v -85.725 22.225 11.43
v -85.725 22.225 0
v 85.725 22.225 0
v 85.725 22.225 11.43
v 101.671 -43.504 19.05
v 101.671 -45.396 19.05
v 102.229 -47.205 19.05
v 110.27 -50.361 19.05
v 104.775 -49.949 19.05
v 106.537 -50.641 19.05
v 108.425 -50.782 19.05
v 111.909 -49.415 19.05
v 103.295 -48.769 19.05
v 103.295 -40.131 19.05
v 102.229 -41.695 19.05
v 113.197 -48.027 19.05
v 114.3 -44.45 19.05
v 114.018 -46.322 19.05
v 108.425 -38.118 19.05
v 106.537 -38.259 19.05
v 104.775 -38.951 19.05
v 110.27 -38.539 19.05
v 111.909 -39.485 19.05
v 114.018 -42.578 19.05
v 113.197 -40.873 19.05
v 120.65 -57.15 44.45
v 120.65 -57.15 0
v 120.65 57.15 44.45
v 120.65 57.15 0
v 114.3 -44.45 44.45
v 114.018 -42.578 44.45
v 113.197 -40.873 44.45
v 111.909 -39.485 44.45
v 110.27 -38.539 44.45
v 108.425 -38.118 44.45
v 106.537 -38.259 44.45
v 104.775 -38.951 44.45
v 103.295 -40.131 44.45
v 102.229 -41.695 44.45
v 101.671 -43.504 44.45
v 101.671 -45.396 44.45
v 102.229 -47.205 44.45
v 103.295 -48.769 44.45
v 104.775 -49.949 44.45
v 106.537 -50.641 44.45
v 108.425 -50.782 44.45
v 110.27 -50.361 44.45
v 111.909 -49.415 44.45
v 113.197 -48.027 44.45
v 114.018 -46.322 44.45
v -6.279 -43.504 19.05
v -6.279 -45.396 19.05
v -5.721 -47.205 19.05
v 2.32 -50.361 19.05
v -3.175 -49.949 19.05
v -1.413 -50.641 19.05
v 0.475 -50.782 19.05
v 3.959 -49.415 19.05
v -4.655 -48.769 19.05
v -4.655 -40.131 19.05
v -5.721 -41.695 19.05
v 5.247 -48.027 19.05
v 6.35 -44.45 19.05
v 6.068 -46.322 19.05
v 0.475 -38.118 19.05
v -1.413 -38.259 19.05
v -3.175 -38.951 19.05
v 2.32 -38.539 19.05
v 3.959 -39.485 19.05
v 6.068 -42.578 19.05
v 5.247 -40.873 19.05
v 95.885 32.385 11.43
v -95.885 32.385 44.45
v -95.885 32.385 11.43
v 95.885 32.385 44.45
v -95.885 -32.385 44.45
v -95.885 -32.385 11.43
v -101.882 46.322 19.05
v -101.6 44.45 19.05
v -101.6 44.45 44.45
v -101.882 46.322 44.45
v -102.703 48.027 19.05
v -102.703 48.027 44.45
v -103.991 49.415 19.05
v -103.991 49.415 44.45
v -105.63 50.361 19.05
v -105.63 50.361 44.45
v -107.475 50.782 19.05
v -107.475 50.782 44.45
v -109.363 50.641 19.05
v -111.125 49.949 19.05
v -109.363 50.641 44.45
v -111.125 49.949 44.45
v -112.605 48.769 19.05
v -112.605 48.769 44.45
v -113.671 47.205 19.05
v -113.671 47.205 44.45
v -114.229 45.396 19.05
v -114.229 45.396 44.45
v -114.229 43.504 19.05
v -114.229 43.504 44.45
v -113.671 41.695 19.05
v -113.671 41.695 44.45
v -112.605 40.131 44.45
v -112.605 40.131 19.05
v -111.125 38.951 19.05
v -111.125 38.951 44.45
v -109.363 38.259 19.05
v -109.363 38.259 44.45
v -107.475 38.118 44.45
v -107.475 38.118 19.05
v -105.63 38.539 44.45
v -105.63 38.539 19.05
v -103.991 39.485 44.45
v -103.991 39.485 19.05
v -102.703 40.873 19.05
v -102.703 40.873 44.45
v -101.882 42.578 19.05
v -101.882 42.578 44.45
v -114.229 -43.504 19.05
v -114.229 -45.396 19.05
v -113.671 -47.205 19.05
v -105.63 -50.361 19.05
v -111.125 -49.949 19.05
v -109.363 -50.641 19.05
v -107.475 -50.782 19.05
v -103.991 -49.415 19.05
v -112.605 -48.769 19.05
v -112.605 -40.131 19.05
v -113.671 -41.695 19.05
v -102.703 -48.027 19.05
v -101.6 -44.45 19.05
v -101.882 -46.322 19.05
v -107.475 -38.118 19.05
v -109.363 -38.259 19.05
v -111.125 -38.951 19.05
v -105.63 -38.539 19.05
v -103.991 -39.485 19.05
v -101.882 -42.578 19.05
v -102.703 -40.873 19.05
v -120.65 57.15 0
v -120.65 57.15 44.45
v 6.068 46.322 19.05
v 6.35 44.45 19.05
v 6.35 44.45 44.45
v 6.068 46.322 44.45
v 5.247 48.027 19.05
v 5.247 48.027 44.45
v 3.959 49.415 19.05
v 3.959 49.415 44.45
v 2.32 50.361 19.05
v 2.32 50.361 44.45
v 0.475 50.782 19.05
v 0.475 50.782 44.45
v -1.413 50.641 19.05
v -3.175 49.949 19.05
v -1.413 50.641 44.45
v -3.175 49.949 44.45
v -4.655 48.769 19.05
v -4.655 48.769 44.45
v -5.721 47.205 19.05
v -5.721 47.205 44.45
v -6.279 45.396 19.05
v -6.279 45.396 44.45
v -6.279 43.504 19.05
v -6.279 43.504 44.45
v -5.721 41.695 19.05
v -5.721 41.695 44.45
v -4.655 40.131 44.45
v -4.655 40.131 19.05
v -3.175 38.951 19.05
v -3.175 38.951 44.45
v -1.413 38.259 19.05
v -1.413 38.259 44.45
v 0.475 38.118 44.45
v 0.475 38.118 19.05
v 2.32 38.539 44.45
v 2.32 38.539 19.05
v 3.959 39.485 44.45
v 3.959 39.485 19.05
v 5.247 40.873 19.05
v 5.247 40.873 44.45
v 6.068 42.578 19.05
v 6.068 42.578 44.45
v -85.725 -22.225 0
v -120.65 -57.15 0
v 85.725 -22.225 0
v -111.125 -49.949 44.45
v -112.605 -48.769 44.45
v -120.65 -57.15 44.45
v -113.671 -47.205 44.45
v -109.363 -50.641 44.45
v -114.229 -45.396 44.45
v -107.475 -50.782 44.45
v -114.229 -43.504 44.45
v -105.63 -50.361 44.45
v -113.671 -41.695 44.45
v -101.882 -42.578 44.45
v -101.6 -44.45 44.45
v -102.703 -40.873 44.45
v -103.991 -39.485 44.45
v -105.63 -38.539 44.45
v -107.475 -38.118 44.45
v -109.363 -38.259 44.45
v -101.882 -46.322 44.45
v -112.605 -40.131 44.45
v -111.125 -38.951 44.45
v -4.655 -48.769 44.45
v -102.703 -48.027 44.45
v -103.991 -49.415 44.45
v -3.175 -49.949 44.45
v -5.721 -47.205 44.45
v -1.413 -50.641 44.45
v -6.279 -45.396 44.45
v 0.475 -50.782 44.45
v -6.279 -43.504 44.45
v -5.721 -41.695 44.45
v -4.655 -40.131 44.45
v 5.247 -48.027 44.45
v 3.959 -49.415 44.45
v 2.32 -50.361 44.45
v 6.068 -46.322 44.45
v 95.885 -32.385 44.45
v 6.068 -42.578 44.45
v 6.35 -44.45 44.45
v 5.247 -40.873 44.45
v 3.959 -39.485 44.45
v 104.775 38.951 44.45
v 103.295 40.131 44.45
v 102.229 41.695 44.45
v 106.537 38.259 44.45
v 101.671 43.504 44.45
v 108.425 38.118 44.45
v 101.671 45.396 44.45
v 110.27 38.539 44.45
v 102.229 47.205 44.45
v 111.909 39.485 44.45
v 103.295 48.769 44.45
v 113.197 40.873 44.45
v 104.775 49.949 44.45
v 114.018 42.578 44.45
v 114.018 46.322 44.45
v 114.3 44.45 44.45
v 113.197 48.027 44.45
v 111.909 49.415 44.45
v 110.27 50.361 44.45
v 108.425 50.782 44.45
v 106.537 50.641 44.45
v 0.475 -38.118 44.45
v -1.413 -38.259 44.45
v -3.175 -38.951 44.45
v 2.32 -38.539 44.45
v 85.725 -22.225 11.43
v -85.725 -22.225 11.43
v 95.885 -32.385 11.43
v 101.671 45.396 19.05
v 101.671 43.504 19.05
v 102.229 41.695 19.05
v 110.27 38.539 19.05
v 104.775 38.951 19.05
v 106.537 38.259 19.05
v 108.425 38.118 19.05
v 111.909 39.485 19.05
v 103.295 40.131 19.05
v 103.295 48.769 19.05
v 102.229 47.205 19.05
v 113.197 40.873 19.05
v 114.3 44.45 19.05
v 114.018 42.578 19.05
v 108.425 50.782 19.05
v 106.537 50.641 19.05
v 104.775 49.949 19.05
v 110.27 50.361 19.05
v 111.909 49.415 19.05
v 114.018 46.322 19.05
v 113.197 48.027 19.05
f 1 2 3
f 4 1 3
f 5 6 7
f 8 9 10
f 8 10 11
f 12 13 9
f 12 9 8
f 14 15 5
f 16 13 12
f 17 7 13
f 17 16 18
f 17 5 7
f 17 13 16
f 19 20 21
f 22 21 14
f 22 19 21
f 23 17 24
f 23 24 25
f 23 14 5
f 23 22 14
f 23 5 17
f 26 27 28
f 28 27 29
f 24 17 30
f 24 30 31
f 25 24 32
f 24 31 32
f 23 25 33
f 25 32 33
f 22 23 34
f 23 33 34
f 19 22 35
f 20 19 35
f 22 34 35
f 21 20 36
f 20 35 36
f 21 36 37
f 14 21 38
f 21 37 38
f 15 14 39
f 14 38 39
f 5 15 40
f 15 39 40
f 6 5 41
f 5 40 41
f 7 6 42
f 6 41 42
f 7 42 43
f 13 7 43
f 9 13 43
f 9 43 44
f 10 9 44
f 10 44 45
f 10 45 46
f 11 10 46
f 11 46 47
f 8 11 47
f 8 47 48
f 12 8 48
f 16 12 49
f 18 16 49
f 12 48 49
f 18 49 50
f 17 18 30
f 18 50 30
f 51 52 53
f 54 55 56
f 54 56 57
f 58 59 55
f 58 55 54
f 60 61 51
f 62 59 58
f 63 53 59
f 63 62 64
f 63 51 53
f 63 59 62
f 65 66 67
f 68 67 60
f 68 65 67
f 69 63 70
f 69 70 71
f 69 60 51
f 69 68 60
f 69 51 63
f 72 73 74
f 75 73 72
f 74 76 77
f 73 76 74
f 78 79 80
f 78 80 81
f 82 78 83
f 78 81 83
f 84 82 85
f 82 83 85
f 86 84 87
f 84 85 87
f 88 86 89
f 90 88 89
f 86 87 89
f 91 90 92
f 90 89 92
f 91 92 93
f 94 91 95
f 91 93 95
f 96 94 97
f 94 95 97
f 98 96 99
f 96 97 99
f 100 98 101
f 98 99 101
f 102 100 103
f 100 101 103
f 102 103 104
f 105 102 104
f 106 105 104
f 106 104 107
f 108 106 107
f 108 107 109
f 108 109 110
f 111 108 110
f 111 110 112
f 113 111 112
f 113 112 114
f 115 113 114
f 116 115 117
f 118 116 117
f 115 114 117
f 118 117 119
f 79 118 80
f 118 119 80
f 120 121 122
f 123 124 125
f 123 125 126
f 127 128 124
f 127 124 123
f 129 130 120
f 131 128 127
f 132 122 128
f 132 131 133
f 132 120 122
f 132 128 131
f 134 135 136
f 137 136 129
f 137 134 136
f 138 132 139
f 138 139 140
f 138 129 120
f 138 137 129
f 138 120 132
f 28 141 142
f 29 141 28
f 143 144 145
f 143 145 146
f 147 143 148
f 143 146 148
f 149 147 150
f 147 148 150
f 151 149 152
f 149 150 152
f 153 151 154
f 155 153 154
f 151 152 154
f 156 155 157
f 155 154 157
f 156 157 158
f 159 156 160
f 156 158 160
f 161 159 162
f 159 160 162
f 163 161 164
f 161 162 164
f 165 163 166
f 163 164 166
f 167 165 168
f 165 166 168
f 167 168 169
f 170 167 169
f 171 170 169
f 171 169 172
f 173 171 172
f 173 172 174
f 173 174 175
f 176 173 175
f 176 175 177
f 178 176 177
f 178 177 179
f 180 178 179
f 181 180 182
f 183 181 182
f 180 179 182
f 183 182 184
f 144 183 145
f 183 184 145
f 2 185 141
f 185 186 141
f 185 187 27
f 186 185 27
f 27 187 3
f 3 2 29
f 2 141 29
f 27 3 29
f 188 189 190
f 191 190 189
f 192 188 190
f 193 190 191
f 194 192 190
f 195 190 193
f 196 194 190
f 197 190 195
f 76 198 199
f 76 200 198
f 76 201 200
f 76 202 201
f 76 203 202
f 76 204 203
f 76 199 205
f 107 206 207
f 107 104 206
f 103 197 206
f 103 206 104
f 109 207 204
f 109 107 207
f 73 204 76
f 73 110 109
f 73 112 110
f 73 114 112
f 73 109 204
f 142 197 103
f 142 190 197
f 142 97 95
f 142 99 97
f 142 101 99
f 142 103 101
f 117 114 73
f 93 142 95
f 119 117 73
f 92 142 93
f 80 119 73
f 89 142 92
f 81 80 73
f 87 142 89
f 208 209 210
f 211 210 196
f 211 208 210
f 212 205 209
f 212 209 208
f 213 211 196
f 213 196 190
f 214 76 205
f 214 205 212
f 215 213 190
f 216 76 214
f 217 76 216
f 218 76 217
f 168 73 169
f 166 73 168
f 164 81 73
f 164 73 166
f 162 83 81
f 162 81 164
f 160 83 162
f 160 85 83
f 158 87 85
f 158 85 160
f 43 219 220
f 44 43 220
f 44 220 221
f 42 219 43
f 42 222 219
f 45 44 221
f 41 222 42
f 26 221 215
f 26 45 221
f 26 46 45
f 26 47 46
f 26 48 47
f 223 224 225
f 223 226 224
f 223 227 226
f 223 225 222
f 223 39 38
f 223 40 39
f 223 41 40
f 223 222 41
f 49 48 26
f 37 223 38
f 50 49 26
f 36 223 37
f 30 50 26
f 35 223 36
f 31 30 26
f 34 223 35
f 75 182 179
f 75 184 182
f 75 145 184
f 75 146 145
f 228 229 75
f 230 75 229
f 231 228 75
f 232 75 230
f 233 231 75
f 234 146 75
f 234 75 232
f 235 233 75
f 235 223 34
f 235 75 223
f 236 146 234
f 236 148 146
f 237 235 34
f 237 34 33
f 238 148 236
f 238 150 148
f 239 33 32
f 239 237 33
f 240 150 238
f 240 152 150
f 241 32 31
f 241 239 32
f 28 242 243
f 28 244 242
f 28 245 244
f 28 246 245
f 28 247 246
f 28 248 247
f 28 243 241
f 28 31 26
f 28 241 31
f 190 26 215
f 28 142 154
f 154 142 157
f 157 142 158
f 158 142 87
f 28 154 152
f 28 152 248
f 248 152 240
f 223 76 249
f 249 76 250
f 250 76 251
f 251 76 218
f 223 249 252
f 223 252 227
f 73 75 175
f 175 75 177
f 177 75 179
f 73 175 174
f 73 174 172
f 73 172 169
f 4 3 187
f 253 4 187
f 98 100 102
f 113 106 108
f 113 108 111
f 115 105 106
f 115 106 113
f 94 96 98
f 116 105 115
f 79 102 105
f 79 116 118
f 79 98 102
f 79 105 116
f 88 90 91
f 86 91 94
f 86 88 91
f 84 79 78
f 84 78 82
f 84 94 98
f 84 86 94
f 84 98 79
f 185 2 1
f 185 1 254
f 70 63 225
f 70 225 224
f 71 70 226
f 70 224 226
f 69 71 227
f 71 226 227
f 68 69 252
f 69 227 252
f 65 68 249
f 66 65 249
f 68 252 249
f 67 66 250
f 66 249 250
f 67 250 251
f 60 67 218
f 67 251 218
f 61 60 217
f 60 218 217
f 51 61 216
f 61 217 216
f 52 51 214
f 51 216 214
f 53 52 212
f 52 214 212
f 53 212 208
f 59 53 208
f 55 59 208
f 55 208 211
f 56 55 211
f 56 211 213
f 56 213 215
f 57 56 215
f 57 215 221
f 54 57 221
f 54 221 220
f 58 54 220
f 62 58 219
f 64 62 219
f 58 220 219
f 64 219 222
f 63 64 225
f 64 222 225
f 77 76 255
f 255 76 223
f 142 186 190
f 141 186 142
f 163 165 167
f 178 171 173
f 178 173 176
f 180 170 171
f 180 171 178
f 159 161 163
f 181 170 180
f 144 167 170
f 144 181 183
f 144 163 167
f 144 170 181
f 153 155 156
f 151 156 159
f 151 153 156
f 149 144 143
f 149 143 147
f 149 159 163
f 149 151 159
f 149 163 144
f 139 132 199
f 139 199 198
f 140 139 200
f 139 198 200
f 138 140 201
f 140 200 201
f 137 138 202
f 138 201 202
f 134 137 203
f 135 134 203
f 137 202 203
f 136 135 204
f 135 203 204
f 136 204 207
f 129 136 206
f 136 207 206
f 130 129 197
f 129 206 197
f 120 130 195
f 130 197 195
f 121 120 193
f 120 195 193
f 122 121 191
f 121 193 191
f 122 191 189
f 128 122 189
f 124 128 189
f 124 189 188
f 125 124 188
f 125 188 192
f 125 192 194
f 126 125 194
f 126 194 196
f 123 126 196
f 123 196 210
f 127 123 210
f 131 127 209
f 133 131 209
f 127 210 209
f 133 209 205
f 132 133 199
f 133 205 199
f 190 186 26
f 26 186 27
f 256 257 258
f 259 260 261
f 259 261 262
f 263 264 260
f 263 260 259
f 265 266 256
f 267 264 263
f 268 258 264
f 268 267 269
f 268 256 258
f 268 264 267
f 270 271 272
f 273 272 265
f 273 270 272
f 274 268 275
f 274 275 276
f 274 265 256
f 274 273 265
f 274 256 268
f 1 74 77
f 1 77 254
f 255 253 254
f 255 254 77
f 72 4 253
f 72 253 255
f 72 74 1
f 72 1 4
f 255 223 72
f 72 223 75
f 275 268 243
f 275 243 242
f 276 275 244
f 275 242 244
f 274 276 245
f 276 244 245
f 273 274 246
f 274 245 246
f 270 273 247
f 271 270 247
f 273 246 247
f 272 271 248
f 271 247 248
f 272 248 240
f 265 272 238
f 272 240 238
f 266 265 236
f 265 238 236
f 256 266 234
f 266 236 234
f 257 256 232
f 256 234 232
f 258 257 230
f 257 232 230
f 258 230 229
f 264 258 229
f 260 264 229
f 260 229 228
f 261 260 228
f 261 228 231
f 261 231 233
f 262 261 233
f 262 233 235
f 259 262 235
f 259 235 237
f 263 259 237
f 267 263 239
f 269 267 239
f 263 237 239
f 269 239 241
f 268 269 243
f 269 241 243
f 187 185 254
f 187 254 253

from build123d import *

# Parameters (mm, degrees)
F0_W     = 241.3
F0_H     = 114.3
F1_DEPTH = 44.45
F2_W     = 191.77
F2_H     = 64.77
F3_DEPTH = 33.02
F4_W     = 171.45
F4_H     = 44.45
F5_DEPTH = 25.4
F6_R     = 6.35
F7_DEPTH = 25.4


with BuildPart() as f1:
    # F0 (on Top) → F1 (new body)
    with BuildSketch(Plane.XY):
        Rectangle(F0_W, F0_H)
    extrude(amount=F1_DEPTH)

    # F2 (on face) → F3 (cut)
    with BuildSketch(Plane.XY.offset(44.45)):
        Rectangle(F2_W, F2_H)
    extrude(amount=-F3_DEPTH, mode=Mode.SUBTRACT)

    # F4 (on face) → F5 (cut)
    with BuildSketch(Plane(origin=(0, 0, 0), x_dir=(1, 0, 0), z_dir=(0, 0, -1))):
        Rectangle(F4_W, F4_H)
    extrude(amount=-F5_DEPTH, mode=Mode.SUBTRACT)

    # F6 (on face) → F7 (cut)
    with BuildSketch(Plane.XY.offset(44.45)):
        with Locations((-107.95, 44.45)):
            Circle(F6_R)
        with Locations((0, 44.45)):
            Circle(F6_R)
        with Locations((107.95, 44.45)):
            Circle(F6_R)
        with Locations((107.95, -44.45)):
            Circle(F6_R)
        with Locations((0, -44.45)):
            Circle(F6_R)
        with Locations((-107.95, -44.45)):
            Circle(F6_R)
    extrude(amount=-F7_DEPTH, mode=Mode.SUBTRACT)


solid = f1.part
